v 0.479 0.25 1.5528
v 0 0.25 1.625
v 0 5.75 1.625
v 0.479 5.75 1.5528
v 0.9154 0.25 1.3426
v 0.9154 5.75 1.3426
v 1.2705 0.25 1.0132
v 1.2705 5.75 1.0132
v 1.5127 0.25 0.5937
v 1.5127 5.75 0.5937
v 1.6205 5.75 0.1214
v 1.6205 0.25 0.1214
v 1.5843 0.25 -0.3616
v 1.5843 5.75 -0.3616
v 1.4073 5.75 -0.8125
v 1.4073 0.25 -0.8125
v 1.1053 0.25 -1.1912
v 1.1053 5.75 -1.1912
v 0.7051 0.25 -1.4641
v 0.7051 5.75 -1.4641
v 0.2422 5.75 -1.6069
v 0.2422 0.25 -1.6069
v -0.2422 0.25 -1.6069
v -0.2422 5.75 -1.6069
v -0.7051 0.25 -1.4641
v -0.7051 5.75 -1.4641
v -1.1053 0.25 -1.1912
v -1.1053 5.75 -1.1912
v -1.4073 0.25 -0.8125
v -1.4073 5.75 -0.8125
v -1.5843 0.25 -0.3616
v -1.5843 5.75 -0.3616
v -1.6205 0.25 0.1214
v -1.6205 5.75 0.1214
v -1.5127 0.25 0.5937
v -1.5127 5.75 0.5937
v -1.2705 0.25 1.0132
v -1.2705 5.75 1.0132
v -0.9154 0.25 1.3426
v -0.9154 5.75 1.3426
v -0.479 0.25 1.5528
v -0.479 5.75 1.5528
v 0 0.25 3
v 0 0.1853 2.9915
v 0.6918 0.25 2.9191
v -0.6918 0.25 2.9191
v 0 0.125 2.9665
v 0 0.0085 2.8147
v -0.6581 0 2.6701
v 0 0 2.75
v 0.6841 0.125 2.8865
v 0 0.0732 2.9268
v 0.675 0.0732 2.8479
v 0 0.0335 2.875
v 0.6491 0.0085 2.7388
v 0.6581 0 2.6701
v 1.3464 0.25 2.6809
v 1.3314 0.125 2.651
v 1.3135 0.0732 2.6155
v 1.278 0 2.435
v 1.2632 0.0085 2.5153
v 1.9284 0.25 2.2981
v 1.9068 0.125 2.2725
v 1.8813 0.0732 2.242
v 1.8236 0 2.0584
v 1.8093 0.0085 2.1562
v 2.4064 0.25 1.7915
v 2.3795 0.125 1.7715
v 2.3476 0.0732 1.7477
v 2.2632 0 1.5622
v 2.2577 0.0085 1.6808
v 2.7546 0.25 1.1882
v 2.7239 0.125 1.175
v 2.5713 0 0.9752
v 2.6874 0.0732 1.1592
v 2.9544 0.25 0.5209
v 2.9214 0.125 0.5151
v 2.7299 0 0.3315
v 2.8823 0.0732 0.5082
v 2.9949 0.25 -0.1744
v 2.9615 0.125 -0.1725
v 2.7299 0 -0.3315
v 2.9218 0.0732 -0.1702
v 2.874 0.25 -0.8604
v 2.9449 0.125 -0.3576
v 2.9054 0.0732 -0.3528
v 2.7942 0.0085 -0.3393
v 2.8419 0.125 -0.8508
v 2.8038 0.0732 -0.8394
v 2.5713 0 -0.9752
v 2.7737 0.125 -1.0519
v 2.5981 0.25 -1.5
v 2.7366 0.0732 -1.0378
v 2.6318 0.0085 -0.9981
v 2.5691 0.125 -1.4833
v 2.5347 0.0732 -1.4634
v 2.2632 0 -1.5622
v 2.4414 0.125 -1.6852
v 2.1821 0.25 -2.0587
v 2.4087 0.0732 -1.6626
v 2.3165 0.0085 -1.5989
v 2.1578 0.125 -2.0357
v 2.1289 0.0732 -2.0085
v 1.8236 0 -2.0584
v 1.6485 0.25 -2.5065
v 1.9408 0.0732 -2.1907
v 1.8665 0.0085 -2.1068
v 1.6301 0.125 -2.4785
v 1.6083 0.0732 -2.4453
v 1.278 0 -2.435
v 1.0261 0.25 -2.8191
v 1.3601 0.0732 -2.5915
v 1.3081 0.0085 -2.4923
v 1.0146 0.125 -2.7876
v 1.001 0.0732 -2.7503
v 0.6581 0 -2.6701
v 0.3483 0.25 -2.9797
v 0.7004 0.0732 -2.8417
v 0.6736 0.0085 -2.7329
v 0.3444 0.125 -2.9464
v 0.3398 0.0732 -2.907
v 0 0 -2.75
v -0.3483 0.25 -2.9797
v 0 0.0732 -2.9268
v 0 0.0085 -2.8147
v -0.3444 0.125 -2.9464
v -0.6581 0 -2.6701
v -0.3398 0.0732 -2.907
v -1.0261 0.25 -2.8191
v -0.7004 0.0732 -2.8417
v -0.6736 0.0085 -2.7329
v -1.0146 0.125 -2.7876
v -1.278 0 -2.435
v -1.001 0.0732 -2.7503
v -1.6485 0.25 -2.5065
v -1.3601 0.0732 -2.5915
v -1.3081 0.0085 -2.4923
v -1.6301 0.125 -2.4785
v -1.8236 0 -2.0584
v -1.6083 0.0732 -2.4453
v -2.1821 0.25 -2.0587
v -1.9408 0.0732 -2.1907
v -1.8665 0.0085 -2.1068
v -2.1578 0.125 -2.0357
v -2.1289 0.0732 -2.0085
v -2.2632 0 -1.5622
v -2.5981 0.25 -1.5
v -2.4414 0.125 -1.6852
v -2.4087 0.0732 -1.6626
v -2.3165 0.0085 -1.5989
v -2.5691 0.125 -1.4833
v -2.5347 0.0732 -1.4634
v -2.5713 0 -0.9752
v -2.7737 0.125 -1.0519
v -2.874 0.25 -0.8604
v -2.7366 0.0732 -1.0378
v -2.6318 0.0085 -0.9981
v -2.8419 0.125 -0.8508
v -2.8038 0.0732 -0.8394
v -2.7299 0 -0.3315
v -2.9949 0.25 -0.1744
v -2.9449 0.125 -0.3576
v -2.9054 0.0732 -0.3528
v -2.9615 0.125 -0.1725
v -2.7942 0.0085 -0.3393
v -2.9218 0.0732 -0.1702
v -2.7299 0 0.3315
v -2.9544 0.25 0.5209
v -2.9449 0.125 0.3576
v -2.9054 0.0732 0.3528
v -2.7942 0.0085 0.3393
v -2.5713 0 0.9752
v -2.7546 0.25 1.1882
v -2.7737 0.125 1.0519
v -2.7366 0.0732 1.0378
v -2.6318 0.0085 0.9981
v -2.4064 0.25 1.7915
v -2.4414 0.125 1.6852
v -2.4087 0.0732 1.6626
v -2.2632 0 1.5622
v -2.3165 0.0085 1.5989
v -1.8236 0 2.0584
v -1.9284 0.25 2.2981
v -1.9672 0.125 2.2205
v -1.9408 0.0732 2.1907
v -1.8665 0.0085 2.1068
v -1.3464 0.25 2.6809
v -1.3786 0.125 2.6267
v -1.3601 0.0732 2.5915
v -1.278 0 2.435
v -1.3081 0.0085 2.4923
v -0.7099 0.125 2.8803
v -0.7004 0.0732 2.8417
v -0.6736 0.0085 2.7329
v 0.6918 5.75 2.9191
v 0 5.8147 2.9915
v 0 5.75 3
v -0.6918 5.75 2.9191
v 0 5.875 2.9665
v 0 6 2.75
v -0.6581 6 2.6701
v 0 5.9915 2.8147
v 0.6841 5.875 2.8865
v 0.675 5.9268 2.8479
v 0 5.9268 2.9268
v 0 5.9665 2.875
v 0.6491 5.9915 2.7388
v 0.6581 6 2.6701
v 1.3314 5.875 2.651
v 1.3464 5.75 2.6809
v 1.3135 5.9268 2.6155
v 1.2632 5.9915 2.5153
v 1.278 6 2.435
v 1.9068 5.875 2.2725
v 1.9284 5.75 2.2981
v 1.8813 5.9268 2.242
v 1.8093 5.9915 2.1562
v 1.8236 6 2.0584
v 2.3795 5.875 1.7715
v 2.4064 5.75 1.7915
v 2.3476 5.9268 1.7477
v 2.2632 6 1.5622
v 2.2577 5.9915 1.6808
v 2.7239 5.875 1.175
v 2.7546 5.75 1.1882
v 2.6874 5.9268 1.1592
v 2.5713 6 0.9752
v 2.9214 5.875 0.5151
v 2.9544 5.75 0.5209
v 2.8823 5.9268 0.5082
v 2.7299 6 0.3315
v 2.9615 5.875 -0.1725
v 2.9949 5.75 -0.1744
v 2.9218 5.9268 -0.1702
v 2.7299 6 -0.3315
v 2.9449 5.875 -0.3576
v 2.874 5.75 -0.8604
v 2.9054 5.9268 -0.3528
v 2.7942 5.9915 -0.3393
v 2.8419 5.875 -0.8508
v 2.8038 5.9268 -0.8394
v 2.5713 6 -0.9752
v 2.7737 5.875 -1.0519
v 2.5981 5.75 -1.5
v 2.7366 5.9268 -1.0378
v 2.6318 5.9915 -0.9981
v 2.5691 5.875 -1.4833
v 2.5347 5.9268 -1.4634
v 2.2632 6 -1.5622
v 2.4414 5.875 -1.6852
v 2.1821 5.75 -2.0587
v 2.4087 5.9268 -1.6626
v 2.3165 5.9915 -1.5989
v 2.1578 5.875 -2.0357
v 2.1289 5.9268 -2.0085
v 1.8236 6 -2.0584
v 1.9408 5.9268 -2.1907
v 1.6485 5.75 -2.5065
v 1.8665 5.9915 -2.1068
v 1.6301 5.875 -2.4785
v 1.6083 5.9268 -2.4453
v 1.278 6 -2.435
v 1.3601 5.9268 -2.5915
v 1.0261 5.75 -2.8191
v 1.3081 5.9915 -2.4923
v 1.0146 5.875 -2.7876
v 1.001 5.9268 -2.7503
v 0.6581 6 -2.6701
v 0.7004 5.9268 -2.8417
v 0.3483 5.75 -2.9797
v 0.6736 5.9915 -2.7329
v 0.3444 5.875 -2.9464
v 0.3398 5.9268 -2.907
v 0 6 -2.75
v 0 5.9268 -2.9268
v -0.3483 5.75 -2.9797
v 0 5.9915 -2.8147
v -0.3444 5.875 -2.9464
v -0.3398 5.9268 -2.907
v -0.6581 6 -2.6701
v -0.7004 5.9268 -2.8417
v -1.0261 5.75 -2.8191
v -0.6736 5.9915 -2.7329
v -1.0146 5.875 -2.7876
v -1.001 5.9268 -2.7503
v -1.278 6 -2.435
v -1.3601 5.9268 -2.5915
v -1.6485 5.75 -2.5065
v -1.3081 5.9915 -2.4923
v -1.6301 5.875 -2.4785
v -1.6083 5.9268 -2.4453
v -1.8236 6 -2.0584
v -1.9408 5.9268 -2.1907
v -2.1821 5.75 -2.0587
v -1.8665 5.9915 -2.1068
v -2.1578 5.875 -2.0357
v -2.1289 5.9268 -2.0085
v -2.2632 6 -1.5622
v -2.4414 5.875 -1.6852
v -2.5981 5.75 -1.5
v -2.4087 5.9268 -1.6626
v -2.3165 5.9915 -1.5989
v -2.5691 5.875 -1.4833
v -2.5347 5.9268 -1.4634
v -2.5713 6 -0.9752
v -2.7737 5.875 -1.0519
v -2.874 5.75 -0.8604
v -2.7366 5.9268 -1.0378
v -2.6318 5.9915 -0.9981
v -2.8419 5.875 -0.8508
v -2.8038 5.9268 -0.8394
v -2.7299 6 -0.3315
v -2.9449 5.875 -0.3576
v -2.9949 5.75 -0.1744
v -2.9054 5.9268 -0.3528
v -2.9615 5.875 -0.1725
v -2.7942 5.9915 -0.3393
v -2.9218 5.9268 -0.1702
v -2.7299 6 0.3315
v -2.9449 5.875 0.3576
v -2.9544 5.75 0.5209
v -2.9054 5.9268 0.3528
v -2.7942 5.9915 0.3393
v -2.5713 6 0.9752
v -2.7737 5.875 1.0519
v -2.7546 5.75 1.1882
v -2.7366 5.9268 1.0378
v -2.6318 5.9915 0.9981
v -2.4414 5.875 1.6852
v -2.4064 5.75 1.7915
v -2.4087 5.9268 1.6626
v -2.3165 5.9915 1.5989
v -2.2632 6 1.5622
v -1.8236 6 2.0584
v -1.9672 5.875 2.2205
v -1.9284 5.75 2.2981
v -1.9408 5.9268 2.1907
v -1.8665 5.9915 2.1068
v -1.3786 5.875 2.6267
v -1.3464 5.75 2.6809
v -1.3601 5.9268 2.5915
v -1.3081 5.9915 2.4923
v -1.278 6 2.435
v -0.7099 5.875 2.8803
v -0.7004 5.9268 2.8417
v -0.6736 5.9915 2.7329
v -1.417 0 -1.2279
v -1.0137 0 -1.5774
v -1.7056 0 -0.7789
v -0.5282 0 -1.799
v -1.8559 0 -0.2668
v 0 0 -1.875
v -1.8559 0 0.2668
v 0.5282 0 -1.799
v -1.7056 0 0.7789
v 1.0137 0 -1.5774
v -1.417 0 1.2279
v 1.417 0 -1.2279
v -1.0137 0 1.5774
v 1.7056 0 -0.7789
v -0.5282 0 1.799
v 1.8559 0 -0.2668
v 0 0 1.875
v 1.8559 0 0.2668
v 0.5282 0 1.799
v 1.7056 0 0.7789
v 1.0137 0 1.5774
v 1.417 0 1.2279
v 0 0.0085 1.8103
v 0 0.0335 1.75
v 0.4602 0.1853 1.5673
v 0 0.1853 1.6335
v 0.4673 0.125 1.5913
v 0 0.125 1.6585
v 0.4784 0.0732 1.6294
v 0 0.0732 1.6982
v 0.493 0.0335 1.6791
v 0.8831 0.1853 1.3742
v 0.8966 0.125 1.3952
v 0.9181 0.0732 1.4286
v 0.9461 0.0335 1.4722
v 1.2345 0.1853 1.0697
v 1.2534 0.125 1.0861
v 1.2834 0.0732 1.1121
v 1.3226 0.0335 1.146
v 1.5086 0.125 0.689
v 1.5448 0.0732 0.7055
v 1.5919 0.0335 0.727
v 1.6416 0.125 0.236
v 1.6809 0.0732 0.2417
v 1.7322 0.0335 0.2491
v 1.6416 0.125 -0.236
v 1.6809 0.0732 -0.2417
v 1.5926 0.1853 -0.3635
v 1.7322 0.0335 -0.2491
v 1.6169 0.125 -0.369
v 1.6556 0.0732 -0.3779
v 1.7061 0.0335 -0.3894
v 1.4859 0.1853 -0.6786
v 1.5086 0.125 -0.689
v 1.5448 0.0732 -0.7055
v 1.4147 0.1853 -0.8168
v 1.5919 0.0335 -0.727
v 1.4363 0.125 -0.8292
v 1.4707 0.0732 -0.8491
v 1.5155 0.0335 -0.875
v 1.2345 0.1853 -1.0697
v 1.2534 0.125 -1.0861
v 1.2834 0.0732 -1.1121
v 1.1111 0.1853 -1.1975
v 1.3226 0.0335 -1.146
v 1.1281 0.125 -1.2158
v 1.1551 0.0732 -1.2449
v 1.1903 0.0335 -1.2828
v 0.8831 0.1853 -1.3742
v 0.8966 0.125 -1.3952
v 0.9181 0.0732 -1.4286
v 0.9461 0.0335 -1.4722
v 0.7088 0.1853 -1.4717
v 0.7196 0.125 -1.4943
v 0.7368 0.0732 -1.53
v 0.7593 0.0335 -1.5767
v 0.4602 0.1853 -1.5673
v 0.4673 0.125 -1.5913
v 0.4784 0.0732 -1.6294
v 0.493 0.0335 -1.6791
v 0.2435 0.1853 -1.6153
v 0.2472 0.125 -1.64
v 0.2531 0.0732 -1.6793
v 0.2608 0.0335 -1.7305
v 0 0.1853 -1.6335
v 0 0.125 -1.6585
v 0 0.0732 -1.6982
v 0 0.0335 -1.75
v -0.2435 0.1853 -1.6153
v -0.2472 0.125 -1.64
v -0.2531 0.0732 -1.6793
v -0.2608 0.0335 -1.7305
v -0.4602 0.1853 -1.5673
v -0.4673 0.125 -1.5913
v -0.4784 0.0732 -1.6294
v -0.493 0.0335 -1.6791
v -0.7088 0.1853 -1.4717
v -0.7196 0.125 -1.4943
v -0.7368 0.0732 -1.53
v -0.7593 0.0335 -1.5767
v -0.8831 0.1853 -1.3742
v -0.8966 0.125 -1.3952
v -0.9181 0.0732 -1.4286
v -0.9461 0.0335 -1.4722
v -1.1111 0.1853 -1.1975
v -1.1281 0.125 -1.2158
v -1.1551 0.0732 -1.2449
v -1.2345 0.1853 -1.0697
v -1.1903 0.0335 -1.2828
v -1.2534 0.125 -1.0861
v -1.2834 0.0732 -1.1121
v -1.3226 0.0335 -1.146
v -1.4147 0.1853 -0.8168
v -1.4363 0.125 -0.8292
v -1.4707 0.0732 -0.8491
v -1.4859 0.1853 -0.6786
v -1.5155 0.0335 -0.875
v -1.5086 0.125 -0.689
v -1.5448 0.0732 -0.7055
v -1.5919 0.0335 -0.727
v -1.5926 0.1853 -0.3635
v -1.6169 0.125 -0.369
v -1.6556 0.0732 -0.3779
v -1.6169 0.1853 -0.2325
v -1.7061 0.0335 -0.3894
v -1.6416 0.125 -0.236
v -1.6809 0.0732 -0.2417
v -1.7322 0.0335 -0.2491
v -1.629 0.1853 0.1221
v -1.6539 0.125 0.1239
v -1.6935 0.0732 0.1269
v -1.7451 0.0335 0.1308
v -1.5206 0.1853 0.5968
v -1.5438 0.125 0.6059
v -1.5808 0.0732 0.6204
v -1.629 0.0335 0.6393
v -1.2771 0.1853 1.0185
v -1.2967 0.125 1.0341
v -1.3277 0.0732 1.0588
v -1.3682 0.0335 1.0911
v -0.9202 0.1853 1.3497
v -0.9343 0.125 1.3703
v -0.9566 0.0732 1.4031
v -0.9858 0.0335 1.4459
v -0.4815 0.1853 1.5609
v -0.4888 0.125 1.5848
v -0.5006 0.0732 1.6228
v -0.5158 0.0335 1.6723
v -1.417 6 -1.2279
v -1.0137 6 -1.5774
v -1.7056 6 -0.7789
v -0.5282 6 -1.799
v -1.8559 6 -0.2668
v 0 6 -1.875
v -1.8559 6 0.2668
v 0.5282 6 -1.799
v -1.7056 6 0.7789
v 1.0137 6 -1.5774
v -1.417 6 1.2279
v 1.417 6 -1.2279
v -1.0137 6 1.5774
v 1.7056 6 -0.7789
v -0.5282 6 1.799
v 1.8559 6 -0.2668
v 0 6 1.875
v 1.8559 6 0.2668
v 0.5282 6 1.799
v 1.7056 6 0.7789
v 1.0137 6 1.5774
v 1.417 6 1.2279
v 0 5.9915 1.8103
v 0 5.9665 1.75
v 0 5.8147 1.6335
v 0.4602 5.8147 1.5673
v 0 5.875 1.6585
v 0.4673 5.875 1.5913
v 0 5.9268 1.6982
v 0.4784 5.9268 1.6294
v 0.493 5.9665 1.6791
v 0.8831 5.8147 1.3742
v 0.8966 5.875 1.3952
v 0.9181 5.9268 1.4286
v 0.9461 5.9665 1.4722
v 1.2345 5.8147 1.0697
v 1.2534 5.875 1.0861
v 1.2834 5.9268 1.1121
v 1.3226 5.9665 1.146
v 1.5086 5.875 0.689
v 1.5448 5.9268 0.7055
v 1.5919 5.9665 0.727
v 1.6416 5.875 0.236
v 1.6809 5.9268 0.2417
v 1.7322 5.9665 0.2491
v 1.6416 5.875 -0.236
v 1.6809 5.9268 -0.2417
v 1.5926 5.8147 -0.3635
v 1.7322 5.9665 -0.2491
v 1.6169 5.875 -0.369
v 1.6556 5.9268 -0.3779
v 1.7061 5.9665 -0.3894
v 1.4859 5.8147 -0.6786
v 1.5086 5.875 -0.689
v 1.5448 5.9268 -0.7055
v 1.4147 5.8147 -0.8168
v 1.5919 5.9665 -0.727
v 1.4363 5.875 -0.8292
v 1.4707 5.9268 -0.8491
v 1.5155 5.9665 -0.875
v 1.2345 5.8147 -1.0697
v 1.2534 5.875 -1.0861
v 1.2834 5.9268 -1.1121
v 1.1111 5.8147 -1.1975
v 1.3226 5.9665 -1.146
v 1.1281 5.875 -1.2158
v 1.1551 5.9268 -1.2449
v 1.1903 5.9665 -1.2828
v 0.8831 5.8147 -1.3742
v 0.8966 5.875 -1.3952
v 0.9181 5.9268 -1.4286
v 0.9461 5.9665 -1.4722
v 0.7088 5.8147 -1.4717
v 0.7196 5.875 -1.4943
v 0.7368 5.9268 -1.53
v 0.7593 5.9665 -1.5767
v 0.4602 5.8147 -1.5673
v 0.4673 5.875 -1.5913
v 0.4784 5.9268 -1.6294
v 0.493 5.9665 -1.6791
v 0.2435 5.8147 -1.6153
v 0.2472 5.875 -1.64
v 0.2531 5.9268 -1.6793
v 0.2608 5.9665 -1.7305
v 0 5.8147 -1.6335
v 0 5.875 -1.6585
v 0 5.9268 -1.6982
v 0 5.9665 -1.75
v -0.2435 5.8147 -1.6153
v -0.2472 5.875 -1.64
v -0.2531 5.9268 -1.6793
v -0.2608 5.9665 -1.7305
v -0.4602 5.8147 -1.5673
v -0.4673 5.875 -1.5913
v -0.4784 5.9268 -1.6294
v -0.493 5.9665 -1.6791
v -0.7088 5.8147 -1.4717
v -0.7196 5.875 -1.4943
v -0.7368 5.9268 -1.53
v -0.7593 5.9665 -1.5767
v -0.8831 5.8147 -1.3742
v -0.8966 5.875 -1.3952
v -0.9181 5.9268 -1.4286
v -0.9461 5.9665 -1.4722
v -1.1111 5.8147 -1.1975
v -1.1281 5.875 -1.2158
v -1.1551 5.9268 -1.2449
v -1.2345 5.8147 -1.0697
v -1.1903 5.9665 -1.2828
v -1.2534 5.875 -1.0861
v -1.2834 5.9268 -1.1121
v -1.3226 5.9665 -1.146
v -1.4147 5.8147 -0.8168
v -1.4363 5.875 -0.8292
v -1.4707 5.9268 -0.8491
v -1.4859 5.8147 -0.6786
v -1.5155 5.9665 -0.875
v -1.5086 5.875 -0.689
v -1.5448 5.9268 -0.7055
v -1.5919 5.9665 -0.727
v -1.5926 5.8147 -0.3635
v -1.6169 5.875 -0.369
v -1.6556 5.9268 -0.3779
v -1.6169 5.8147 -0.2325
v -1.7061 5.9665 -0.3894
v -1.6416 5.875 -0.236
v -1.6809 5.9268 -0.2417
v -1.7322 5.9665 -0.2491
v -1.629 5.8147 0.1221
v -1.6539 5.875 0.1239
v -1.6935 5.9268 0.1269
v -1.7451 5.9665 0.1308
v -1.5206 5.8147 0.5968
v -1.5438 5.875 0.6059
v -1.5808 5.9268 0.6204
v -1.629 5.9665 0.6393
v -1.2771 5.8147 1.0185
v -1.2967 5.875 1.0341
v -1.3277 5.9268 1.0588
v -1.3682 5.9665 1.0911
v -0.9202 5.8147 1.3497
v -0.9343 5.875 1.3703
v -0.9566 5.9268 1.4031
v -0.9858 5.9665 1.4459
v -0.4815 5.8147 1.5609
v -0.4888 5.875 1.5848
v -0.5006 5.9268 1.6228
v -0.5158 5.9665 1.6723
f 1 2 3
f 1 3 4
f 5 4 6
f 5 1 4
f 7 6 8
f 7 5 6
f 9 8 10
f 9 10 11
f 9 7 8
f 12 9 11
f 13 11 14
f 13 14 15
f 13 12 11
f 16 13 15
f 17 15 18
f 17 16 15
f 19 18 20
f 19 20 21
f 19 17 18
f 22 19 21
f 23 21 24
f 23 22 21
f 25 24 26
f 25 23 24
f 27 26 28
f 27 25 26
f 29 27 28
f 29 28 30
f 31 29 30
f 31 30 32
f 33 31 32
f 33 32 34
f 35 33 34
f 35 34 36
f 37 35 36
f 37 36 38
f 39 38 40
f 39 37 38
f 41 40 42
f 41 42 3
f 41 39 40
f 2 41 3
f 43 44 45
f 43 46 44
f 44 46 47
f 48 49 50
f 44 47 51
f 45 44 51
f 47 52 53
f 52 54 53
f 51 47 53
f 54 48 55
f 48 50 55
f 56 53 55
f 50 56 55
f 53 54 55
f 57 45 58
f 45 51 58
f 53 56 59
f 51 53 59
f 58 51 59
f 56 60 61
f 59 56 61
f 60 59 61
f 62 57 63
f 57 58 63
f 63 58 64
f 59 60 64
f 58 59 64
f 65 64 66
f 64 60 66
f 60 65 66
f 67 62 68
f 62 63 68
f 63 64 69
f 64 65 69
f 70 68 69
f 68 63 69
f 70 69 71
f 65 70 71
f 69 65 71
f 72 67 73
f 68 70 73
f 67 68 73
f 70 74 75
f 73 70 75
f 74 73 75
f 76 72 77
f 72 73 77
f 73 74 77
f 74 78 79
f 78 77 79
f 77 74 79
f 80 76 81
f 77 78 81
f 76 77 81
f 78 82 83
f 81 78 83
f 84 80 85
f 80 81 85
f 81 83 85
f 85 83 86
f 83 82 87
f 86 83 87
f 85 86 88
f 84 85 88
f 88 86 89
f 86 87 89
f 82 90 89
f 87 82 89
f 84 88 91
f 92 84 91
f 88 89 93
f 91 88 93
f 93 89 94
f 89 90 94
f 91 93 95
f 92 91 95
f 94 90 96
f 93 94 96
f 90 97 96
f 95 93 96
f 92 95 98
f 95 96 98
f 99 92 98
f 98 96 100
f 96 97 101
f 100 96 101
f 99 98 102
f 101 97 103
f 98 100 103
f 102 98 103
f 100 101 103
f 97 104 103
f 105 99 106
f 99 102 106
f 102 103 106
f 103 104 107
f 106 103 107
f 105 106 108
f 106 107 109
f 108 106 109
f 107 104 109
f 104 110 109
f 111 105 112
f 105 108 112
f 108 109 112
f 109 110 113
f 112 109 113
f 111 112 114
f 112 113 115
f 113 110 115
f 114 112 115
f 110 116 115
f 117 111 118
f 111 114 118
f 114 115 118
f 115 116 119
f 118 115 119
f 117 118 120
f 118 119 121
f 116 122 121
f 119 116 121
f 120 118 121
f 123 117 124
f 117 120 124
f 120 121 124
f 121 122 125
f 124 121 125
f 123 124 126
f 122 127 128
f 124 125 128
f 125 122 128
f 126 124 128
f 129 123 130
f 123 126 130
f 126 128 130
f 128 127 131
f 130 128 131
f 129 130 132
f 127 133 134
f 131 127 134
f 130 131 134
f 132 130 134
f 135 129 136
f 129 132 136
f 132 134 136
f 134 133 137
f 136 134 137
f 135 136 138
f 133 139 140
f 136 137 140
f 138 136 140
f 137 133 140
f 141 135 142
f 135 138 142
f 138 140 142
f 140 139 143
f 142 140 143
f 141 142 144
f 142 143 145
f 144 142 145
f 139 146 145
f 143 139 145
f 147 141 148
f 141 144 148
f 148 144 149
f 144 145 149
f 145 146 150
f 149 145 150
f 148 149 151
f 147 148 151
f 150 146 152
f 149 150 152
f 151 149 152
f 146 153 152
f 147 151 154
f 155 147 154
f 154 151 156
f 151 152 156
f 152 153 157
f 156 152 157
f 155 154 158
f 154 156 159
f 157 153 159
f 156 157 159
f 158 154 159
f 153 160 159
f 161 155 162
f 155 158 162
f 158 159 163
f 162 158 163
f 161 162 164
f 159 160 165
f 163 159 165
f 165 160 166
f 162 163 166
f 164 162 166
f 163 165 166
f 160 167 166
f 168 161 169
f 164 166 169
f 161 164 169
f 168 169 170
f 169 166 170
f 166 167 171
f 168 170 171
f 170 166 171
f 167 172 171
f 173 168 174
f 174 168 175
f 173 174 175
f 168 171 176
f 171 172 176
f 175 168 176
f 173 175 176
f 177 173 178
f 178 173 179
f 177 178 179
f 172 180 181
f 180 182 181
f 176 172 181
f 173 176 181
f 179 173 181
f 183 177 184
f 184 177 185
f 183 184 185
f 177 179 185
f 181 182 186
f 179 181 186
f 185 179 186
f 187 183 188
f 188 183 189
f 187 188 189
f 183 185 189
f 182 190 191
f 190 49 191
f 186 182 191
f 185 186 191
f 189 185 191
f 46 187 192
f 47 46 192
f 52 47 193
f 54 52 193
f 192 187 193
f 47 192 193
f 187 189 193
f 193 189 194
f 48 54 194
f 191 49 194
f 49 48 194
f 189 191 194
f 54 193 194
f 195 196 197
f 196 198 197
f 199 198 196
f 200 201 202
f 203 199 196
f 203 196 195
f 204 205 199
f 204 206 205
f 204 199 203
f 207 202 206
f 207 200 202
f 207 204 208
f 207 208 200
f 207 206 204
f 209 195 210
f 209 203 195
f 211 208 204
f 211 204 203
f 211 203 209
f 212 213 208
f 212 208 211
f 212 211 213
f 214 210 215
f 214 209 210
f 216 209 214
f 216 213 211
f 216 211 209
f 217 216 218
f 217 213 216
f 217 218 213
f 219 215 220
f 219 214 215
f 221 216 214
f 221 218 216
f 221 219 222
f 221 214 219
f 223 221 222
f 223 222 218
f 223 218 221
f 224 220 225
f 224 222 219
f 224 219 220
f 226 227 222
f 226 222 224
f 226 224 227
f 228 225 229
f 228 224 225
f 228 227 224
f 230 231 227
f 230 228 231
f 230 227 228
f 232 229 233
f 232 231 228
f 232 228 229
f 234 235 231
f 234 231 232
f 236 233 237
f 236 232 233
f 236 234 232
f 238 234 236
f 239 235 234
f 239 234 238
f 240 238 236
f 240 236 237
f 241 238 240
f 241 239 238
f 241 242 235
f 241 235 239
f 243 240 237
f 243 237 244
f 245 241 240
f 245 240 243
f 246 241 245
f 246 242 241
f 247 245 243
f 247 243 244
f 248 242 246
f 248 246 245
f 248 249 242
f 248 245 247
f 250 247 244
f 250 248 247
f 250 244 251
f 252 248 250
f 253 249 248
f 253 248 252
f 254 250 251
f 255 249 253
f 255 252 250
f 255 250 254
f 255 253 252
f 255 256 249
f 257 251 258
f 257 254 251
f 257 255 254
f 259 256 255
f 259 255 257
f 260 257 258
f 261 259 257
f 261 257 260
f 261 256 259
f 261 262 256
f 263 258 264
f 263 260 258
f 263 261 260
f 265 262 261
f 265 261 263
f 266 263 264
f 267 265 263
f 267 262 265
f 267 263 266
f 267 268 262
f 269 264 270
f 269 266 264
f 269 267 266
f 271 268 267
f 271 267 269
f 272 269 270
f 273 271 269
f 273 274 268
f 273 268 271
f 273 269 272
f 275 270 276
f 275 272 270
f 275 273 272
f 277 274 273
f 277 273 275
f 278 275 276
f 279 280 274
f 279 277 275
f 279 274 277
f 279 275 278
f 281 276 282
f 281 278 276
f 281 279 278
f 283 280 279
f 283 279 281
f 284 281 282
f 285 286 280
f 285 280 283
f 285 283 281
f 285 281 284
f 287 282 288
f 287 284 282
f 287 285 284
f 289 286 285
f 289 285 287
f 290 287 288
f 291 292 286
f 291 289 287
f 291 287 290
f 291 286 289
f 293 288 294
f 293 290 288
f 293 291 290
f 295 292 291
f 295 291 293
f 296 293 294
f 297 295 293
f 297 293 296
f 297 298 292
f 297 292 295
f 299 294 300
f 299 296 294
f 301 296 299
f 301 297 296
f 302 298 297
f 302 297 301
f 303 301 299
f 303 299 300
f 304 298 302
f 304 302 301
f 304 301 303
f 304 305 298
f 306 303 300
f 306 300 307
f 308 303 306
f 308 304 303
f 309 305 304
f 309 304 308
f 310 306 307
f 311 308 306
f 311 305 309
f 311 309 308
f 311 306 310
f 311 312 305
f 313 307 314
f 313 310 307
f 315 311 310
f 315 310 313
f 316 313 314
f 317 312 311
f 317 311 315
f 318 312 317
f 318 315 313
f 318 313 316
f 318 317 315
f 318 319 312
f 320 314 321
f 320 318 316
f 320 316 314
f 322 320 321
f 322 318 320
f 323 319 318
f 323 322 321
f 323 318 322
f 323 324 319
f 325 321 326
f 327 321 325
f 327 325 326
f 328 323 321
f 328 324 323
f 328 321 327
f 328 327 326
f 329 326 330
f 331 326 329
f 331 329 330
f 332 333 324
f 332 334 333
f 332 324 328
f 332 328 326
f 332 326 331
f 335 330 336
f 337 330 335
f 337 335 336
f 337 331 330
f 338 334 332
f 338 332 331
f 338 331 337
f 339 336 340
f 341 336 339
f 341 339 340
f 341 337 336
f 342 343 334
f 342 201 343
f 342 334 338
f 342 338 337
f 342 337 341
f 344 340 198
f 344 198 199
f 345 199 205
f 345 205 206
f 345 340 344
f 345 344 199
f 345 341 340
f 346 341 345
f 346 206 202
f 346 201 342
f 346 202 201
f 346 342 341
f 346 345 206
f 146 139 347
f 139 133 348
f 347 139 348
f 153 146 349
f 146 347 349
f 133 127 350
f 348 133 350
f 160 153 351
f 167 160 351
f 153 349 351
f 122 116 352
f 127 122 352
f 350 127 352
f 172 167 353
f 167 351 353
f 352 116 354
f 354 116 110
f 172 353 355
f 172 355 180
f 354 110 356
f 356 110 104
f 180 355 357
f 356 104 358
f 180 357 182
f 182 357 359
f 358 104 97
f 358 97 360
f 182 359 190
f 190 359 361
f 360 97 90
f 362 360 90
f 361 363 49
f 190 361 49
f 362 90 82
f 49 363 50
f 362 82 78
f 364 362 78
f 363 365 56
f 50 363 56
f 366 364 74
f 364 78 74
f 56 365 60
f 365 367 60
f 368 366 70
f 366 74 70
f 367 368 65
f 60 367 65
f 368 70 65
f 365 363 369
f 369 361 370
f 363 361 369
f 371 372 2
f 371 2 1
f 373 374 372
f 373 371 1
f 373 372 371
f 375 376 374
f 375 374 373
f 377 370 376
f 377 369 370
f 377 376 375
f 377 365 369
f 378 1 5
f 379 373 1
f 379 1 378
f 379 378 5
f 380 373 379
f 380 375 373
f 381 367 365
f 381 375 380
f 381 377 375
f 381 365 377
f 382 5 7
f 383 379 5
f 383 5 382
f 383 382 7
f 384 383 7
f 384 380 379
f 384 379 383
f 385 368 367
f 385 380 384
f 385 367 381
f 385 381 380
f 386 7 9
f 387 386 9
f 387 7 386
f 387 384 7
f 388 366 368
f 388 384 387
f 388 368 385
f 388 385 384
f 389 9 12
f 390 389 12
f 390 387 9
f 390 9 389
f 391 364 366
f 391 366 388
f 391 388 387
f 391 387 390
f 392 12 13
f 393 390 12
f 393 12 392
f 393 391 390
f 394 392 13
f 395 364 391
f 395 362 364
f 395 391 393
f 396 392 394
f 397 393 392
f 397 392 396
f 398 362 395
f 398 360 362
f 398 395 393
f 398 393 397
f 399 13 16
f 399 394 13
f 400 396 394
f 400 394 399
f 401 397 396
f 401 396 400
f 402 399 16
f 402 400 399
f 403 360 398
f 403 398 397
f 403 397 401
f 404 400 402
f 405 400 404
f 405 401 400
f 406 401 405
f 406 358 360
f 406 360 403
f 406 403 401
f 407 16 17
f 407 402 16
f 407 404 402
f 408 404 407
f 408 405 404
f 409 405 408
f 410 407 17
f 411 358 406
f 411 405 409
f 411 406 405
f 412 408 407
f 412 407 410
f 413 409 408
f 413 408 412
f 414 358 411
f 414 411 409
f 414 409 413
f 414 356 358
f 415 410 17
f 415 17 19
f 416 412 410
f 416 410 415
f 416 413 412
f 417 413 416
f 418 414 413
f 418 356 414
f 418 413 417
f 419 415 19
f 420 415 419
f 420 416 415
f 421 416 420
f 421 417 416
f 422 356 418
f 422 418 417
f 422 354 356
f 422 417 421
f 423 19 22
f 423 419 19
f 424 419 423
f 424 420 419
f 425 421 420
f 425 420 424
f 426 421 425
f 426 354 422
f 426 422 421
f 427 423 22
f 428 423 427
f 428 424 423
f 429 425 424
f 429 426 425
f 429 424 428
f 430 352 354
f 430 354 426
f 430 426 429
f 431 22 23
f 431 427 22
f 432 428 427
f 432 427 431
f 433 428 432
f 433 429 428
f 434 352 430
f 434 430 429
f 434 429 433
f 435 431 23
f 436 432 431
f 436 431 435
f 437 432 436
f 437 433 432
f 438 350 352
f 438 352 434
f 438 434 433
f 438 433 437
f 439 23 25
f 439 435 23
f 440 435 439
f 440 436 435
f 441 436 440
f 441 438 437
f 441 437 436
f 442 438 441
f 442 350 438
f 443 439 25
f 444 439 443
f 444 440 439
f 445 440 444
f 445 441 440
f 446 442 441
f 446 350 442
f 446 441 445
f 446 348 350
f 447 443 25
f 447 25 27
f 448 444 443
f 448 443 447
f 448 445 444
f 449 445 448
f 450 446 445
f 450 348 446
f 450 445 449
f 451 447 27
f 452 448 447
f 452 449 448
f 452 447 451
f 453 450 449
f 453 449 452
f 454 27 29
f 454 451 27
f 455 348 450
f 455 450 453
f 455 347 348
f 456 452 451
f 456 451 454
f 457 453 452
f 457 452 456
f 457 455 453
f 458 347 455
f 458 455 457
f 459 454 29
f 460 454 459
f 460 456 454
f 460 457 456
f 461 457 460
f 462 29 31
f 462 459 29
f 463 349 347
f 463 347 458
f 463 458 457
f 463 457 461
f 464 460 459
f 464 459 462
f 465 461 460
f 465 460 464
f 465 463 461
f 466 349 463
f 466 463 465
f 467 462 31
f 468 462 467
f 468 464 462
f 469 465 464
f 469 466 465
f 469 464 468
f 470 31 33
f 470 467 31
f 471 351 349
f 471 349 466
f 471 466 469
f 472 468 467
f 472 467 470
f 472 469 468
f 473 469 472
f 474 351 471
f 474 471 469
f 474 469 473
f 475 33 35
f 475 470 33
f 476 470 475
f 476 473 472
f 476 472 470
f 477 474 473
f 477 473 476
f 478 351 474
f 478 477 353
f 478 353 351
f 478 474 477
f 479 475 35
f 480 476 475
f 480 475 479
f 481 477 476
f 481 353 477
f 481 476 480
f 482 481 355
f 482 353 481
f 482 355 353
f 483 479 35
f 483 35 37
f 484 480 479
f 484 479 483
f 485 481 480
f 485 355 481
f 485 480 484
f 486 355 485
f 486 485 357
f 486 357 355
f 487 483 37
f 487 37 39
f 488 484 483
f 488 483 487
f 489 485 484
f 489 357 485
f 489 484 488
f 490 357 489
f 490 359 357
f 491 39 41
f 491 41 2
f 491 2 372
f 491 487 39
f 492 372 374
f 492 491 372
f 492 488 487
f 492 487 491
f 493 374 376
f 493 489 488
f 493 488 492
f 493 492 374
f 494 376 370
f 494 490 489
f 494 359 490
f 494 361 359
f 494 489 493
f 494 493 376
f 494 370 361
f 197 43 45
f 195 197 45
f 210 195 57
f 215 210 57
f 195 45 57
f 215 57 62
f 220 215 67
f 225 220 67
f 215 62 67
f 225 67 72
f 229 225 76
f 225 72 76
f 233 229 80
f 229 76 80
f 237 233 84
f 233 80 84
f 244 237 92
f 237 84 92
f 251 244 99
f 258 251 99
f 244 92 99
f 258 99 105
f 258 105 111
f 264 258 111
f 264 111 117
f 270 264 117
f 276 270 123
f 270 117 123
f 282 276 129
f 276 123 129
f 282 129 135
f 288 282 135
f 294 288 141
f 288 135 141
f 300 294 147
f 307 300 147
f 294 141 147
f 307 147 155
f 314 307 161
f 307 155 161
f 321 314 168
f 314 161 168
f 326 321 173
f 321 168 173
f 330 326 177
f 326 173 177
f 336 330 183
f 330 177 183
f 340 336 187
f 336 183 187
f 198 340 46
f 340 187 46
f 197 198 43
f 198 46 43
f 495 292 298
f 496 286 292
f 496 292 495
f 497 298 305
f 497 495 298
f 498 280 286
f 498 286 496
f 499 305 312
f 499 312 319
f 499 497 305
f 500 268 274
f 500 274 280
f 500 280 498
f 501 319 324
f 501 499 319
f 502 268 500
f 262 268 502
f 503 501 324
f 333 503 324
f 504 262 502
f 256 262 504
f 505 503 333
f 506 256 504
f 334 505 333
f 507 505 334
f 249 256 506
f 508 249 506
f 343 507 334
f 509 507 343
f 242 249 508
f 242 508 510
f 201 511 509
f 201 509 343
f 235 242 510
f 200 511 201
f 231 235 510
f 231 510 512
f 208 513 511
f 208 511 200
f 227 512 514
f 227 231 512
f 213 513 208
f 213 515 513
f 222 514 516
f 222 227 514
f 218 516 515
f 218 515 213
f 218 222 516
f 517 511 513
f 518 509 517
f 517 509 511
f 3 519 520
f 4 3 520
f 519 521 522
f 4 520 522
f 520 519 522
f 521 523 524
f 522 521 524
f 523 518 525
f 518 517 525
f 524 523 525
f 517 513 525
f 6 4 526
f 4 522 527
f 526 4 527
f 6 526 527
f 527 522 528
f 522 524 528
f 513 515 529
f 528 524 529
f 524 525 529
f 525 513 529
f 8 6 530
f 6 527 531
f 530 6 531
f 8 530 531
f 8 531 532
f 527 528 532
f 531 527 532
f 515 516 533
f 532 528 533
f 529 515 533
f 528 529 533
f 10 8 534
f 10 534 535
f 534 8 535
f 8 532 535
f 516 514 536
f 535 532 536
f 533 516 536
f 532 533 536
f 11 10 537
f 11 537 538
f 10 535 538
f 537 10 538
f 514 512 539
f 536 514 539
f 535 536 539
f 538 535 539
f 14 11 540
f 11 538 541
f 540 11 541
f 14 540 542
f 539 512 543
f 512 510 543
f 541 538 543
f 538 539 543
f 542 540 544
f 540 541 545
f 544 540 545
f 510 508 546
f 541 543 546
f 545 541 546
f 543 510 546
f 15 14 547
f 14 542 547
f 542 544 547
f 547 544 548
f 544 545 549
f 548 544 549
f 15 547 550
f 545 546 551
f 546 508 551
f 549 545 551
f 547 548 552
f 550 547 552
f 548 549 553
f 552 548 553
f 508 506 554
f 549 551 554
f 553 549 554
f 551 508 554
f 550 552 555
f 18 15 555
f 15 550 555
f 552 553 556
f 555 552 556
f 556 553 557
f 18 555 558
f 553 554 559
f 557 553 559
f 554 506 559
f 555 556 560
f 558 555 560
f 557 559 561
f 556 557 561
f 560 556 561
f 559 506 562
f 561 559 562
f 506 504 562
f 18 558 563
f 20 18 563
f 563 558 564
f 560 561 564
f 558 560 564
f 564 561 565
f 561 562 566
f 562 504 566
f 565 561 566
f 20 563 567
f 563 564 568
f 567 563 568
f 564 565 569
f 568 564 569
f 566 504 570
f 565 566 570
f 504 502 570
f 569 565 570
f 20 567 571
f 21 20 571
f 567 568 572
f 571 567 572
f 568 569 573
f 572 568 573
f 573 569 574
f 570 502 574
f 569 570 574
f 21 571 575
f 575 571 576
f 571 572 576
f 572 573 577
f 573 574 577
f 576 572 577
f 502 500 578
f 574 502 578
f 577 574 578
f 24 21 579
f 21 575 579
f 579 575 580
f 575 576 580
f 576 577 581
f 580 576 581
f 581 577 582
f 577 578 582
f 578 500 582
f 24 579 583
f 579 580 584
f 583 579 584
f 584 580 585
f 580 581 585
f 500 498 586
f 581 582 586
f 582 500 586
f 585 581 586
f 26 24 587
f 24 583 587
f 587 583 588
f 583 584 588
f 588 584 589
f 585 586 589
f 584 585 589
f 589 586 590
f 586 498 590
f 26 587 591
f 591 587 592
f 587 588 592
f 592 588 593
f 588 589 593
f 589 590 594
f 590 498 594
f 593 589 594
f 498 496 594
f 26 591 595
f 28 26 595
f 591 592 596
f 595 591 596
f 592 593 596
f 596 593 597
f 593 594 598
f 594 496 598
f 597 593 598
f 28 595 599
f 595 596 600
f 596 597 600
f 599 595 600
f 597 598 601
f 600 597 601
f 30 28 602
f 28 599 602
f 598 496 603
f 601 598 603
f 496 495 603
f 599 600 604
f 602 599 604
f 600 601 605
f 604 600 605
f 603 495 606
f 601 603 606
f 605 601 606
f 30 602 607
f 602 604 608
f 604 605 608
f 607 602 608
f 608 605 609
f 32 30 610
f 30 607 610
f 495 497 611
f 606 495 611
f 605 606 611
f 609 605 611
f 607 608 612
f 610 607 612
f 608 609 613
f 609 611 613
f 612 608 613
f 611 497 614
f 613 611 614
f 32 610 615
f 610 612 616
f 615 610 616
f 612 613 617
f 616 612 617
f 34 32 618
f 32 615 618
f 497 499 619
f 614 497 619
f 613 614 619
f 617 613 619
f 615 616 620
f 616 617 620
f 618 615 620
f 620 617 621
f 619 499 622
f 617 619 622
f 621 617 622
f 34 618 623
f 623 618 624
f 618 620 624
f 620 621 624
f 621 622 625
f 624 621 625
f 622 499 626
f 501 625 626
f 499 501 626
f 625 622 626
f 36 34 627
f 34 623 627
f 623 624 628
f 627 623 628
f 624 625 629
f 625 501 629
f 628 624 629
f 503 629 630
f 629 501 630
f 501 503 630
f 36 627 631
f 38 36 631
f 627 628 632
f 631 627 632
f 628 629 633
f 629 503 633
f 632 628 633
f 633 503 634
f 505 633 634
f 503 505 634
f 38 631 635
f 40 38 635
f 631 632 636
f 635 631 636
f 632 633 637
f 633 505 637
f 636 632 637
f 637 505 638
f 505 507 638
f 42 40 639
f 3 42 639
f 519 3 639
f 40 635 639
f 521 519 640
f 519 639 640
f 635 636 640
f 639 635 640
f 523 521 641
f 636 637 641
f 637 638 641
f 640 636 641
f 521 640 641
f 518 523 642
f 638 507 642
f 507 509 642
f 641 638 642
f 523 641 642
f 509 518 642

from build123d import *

# Parameters (mm, degrees)
SKETCH1_R           = 3
SKETCH1_R_2         = 1.625
BOSS_EXTRUDE1_DEPTH = 6
FILLET1_R           = 0.25


with BuildPart() as part:
    # Sketch1 → Boss-Extrude1 (new body)
    with BuildSketch(Plane(origin=(0, 0, 0), x_dir=(1, 0, 0), z_dir=(0, 1, 0))):
        with Locations(Location((0, 0, 0), (0, 0, 270))):  # turned: the seam where the file's is
            Circle(SKETCH1_R)
        with Locations(Location((0, 0, 0), (0, 0, 270))):  # turned: the seam where the file's is
            Circle(SKETCH1_R_2, mode=Mode.SUBTRACT)
    extrude(amount=BOSS_EXTRUDE1_DEPTH)

    # Fillet1
    fillet1_edges = [part.edges().sort_by_distance(p)[0] for p in [
        (0, 0, -3),
        (0, 6, -3),
        (0, 0, -1.625),
        (0, 6, -1.625),
    ]]
    fillet(fillet1_edges, radius=FILLET1_R)


solid = part.part
